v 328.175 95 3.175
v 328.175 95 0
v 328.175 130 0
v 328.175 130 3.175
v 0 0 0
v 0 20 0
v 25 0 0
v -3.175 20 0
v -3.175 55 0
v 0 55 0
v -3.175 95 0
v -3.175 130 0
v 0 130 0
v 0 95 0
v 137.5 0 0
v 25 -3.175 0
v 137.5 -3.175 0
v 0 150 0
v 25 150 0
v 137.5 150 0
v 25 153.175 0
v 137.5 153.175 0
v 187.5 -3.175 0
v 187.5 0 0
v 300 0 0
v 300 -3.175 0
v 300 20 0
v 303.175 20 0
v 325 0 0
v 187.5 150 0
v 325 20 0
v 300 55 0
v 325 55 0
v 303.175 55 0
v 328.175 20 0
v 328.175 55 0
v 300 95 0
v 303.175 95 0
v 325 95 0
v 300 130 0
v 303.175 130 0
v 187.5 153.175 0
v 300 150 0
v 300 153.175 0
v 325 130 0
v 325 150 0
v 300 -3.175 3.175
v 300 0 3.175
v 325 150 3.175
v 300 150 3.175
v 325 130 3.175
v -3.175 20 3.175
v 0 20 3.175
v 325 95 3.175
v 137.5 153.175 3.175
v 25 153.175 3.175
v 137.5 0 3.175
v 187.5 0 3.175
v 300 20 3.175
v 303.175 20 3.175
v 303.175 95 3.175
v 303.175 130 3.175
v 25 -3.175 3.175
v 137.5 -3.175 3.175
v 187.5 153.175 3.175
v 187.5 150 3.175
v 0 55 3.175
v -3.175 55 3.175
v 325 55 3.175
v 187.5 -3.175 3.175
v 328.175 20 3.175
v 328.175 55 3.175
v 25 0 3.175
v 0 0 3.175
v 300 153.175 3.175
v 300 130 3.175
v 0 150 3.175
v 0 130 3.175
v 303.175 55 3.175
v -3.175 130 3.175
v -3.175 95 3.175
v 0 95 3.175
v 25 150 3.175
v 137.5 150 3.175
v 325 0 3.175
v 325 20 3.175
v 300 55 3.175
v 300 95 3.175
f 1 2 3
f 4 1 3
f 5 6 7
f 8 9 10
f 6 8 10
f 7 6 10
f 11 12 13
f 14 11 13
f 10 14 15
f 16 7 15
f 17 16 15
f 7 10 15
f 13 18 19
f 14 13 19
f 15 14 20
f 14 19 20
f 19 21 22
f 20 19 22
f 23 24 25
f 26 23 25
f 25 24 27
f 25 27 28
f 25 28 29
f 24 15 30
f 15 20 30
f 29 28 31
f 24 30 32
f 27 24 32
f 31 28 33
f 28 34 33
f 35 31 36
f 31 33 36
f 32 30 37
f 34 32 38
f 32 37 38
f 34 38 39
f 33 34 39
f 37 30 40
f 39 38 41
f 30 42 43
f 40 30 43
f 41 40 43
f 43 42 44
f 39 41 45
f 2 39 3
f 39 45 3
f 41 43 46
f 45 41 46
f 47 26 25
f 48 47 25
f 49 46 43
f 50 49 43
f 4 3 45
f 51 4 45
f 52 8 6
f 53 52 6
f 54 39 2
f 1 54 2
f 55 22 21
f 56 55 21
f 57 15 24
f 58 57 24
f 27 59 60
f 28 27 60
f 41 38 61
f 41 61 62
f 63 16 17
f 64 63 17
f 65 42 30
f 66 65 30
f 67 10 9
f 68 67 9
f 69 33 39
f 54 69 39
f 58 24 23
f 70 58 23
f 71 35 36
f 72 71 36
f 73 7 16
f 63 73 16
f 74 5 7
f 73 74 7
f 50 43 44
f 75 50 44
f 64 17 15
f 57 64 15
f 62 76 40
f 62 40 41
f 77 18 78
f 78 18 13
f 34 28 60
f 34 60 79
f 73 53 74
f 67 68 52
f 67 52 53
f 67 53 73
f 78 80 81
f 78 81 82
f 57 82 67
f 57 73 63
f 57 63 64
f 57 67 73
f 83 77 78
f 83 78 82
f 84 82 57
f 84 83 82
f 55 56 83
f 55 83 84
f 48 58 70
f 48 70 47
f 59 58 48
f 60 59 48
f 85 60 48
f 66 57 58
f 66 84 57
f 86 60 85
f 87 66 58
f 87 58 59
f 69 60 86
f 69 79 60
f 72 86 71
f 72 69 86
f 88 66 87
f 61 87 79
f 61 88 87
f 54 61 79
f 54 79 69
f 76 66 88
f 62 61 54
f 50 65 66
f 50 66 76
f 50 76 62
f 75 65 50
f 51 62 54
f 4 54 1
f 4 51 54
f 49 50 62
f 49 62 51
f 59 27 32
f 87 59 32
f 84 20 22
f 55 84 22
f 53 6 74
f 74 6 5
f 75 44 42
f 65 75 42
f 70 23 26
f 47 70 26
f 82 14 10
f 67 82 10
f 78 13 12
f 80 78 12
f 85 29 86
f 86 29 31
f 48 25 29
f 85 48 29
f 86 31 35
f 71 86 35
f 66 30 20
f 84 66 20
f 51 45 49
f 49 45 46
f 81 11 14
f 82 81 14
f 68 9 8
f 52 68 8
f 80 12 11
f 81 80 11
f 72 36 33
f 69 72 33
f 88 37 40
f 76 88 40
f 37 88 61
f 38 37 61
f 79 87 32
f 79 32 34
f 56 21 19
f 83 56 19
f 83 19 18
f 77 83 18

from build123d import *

# Parameters (mm, degrees)
F0_W     = 3.175
F0_H     = 35
F1_DEPTH = 3.175


with BuildPart() as f1:
    # F0 (on Top) → F1 (new body)
    with BuildSketch(Plane.XY):
        Polygon((137.5, 0), (162.5, 0), (187.5, 0), (187.5, -3.175), (300, -3.175), (300, 0), (325, 0), (325, 20), (328.175, 20), (328.175, 55), (325, 55), (325, 95), (328.175, 95), (328.175, 130), (325, 130), (325, 150), (300, 150), (300, 153.175), (187.5, 153.175), (187.5, 150), (162.5, 150), (137.5, 150), (137.5, 153.175), (25, 153.175), (25, 150), (0, 150), (0, 130), (-3.175, 130), (-3.175, 95), (0, 95), (0, 55), (-3.175, 55), (-3.175, 20), (0, 20), (0, 0), (25, 0), (25, -3.175), (137.5, -3.175), align=None)
        with Locations((301.5875, 37.5)):
            Rectangle(F0_W, F0_H, mode=Mode.SUBTRACT)
        with Locations((301.5875, 112.5)):
            Rectangle(F0_W, F0_H, mode=Mode.SUBTRACT)
    extrude(amount=F1_DEPTH)


solid = f1.part
